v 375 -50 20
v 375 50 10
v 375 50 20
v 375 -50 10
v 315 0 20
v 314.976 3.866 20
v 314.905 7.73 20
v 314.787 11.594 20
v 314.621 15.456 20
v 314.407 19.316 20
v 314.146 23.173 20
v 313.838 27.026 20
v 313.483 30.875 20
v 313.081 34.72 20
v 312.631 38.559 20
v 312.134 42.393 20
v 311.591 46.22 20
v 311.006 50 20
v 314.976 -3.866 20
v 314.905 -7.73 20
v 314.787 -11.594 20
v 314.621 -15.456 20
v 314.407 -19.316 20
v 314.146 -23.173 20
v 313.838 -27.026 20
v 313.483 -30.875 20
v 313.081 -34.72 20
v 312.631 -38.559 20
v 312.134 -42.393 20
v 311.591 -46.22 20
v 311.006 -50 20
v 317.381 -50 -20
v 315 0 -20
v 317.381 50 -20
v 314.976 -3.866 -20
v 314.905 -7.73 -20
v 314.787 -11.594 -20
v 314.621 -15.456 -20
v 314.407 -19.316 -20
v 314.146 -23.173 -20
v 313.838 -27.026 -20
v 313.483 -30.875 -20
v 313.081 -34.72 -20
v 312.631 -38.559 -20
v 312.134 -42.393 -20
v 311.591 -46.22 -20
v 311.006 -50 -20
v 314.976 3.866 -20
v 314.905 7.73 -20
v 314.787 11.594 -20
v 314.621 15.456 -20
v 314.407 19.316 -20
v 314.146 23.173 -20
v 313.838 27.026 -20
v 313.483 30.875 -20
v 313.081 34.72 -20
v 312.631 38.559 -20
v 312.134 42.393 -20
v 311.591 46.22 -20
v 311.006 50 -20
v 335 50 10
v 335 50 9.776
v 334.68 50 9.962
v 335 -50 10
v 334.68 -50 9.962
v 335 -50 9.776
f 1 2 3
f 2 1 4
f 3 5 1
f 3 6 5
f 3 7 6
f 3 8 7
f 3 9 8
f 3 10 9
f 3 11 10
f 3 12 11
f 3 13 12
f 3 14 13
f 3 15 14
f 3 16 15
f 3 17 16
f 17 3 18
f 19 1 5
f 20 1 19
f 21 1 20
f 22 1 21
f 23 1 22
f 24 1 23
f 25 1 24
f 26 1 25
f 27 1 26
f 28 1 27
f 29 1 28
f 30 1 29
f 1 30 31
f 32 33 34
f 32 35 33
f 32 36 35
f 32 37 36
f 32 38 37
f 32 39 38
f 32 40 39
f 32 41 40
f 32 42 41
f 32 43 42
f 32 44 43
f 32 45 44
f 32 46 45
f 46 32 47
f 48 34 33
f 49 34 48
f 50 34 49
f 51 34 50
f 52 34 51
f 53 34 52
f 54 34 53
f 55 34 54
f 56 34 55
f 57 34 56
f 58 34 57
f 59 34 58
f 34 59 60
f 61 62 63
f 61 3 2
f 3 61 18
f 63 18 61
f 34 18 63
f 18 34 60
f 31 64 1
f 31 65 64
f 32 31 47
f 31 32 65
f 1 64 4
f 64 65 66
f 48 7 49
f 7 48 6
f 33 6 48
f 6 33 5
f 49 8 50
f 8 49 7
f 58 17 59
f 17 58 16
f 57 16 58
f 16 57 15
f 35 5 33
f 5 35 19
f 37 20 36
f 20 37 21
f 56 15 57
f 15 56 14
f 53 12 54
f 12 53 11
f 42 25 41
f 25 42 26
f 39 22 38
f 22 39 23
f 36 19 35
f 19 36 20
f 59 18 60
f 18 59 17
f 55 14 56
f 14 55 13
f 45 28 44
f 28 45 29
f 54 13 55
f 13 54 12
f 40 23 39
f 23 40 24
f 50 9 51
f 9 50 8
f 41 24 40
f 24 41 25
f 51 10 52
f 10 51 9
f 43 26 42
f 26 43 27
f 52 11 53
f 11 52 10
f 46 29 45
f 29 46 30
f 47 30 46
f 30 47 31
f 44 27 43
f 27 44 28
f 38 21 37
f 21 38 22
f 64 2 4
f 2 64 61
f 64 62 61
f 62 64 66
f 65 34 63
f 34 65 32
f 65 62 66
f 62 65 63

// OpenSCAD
difference(){
translate([630/2,0,0])cube([120,100,40],center=true);
cylinder(r=630/2,h=50,center=true,$fn=64*8);
    translate([630/2+80,0,-10])cube([120,120,40],center=true);
    translate([630/2+8-1,0,-50-2])rotate([0,-60,0])cube([120,110,40],center=true);
}
